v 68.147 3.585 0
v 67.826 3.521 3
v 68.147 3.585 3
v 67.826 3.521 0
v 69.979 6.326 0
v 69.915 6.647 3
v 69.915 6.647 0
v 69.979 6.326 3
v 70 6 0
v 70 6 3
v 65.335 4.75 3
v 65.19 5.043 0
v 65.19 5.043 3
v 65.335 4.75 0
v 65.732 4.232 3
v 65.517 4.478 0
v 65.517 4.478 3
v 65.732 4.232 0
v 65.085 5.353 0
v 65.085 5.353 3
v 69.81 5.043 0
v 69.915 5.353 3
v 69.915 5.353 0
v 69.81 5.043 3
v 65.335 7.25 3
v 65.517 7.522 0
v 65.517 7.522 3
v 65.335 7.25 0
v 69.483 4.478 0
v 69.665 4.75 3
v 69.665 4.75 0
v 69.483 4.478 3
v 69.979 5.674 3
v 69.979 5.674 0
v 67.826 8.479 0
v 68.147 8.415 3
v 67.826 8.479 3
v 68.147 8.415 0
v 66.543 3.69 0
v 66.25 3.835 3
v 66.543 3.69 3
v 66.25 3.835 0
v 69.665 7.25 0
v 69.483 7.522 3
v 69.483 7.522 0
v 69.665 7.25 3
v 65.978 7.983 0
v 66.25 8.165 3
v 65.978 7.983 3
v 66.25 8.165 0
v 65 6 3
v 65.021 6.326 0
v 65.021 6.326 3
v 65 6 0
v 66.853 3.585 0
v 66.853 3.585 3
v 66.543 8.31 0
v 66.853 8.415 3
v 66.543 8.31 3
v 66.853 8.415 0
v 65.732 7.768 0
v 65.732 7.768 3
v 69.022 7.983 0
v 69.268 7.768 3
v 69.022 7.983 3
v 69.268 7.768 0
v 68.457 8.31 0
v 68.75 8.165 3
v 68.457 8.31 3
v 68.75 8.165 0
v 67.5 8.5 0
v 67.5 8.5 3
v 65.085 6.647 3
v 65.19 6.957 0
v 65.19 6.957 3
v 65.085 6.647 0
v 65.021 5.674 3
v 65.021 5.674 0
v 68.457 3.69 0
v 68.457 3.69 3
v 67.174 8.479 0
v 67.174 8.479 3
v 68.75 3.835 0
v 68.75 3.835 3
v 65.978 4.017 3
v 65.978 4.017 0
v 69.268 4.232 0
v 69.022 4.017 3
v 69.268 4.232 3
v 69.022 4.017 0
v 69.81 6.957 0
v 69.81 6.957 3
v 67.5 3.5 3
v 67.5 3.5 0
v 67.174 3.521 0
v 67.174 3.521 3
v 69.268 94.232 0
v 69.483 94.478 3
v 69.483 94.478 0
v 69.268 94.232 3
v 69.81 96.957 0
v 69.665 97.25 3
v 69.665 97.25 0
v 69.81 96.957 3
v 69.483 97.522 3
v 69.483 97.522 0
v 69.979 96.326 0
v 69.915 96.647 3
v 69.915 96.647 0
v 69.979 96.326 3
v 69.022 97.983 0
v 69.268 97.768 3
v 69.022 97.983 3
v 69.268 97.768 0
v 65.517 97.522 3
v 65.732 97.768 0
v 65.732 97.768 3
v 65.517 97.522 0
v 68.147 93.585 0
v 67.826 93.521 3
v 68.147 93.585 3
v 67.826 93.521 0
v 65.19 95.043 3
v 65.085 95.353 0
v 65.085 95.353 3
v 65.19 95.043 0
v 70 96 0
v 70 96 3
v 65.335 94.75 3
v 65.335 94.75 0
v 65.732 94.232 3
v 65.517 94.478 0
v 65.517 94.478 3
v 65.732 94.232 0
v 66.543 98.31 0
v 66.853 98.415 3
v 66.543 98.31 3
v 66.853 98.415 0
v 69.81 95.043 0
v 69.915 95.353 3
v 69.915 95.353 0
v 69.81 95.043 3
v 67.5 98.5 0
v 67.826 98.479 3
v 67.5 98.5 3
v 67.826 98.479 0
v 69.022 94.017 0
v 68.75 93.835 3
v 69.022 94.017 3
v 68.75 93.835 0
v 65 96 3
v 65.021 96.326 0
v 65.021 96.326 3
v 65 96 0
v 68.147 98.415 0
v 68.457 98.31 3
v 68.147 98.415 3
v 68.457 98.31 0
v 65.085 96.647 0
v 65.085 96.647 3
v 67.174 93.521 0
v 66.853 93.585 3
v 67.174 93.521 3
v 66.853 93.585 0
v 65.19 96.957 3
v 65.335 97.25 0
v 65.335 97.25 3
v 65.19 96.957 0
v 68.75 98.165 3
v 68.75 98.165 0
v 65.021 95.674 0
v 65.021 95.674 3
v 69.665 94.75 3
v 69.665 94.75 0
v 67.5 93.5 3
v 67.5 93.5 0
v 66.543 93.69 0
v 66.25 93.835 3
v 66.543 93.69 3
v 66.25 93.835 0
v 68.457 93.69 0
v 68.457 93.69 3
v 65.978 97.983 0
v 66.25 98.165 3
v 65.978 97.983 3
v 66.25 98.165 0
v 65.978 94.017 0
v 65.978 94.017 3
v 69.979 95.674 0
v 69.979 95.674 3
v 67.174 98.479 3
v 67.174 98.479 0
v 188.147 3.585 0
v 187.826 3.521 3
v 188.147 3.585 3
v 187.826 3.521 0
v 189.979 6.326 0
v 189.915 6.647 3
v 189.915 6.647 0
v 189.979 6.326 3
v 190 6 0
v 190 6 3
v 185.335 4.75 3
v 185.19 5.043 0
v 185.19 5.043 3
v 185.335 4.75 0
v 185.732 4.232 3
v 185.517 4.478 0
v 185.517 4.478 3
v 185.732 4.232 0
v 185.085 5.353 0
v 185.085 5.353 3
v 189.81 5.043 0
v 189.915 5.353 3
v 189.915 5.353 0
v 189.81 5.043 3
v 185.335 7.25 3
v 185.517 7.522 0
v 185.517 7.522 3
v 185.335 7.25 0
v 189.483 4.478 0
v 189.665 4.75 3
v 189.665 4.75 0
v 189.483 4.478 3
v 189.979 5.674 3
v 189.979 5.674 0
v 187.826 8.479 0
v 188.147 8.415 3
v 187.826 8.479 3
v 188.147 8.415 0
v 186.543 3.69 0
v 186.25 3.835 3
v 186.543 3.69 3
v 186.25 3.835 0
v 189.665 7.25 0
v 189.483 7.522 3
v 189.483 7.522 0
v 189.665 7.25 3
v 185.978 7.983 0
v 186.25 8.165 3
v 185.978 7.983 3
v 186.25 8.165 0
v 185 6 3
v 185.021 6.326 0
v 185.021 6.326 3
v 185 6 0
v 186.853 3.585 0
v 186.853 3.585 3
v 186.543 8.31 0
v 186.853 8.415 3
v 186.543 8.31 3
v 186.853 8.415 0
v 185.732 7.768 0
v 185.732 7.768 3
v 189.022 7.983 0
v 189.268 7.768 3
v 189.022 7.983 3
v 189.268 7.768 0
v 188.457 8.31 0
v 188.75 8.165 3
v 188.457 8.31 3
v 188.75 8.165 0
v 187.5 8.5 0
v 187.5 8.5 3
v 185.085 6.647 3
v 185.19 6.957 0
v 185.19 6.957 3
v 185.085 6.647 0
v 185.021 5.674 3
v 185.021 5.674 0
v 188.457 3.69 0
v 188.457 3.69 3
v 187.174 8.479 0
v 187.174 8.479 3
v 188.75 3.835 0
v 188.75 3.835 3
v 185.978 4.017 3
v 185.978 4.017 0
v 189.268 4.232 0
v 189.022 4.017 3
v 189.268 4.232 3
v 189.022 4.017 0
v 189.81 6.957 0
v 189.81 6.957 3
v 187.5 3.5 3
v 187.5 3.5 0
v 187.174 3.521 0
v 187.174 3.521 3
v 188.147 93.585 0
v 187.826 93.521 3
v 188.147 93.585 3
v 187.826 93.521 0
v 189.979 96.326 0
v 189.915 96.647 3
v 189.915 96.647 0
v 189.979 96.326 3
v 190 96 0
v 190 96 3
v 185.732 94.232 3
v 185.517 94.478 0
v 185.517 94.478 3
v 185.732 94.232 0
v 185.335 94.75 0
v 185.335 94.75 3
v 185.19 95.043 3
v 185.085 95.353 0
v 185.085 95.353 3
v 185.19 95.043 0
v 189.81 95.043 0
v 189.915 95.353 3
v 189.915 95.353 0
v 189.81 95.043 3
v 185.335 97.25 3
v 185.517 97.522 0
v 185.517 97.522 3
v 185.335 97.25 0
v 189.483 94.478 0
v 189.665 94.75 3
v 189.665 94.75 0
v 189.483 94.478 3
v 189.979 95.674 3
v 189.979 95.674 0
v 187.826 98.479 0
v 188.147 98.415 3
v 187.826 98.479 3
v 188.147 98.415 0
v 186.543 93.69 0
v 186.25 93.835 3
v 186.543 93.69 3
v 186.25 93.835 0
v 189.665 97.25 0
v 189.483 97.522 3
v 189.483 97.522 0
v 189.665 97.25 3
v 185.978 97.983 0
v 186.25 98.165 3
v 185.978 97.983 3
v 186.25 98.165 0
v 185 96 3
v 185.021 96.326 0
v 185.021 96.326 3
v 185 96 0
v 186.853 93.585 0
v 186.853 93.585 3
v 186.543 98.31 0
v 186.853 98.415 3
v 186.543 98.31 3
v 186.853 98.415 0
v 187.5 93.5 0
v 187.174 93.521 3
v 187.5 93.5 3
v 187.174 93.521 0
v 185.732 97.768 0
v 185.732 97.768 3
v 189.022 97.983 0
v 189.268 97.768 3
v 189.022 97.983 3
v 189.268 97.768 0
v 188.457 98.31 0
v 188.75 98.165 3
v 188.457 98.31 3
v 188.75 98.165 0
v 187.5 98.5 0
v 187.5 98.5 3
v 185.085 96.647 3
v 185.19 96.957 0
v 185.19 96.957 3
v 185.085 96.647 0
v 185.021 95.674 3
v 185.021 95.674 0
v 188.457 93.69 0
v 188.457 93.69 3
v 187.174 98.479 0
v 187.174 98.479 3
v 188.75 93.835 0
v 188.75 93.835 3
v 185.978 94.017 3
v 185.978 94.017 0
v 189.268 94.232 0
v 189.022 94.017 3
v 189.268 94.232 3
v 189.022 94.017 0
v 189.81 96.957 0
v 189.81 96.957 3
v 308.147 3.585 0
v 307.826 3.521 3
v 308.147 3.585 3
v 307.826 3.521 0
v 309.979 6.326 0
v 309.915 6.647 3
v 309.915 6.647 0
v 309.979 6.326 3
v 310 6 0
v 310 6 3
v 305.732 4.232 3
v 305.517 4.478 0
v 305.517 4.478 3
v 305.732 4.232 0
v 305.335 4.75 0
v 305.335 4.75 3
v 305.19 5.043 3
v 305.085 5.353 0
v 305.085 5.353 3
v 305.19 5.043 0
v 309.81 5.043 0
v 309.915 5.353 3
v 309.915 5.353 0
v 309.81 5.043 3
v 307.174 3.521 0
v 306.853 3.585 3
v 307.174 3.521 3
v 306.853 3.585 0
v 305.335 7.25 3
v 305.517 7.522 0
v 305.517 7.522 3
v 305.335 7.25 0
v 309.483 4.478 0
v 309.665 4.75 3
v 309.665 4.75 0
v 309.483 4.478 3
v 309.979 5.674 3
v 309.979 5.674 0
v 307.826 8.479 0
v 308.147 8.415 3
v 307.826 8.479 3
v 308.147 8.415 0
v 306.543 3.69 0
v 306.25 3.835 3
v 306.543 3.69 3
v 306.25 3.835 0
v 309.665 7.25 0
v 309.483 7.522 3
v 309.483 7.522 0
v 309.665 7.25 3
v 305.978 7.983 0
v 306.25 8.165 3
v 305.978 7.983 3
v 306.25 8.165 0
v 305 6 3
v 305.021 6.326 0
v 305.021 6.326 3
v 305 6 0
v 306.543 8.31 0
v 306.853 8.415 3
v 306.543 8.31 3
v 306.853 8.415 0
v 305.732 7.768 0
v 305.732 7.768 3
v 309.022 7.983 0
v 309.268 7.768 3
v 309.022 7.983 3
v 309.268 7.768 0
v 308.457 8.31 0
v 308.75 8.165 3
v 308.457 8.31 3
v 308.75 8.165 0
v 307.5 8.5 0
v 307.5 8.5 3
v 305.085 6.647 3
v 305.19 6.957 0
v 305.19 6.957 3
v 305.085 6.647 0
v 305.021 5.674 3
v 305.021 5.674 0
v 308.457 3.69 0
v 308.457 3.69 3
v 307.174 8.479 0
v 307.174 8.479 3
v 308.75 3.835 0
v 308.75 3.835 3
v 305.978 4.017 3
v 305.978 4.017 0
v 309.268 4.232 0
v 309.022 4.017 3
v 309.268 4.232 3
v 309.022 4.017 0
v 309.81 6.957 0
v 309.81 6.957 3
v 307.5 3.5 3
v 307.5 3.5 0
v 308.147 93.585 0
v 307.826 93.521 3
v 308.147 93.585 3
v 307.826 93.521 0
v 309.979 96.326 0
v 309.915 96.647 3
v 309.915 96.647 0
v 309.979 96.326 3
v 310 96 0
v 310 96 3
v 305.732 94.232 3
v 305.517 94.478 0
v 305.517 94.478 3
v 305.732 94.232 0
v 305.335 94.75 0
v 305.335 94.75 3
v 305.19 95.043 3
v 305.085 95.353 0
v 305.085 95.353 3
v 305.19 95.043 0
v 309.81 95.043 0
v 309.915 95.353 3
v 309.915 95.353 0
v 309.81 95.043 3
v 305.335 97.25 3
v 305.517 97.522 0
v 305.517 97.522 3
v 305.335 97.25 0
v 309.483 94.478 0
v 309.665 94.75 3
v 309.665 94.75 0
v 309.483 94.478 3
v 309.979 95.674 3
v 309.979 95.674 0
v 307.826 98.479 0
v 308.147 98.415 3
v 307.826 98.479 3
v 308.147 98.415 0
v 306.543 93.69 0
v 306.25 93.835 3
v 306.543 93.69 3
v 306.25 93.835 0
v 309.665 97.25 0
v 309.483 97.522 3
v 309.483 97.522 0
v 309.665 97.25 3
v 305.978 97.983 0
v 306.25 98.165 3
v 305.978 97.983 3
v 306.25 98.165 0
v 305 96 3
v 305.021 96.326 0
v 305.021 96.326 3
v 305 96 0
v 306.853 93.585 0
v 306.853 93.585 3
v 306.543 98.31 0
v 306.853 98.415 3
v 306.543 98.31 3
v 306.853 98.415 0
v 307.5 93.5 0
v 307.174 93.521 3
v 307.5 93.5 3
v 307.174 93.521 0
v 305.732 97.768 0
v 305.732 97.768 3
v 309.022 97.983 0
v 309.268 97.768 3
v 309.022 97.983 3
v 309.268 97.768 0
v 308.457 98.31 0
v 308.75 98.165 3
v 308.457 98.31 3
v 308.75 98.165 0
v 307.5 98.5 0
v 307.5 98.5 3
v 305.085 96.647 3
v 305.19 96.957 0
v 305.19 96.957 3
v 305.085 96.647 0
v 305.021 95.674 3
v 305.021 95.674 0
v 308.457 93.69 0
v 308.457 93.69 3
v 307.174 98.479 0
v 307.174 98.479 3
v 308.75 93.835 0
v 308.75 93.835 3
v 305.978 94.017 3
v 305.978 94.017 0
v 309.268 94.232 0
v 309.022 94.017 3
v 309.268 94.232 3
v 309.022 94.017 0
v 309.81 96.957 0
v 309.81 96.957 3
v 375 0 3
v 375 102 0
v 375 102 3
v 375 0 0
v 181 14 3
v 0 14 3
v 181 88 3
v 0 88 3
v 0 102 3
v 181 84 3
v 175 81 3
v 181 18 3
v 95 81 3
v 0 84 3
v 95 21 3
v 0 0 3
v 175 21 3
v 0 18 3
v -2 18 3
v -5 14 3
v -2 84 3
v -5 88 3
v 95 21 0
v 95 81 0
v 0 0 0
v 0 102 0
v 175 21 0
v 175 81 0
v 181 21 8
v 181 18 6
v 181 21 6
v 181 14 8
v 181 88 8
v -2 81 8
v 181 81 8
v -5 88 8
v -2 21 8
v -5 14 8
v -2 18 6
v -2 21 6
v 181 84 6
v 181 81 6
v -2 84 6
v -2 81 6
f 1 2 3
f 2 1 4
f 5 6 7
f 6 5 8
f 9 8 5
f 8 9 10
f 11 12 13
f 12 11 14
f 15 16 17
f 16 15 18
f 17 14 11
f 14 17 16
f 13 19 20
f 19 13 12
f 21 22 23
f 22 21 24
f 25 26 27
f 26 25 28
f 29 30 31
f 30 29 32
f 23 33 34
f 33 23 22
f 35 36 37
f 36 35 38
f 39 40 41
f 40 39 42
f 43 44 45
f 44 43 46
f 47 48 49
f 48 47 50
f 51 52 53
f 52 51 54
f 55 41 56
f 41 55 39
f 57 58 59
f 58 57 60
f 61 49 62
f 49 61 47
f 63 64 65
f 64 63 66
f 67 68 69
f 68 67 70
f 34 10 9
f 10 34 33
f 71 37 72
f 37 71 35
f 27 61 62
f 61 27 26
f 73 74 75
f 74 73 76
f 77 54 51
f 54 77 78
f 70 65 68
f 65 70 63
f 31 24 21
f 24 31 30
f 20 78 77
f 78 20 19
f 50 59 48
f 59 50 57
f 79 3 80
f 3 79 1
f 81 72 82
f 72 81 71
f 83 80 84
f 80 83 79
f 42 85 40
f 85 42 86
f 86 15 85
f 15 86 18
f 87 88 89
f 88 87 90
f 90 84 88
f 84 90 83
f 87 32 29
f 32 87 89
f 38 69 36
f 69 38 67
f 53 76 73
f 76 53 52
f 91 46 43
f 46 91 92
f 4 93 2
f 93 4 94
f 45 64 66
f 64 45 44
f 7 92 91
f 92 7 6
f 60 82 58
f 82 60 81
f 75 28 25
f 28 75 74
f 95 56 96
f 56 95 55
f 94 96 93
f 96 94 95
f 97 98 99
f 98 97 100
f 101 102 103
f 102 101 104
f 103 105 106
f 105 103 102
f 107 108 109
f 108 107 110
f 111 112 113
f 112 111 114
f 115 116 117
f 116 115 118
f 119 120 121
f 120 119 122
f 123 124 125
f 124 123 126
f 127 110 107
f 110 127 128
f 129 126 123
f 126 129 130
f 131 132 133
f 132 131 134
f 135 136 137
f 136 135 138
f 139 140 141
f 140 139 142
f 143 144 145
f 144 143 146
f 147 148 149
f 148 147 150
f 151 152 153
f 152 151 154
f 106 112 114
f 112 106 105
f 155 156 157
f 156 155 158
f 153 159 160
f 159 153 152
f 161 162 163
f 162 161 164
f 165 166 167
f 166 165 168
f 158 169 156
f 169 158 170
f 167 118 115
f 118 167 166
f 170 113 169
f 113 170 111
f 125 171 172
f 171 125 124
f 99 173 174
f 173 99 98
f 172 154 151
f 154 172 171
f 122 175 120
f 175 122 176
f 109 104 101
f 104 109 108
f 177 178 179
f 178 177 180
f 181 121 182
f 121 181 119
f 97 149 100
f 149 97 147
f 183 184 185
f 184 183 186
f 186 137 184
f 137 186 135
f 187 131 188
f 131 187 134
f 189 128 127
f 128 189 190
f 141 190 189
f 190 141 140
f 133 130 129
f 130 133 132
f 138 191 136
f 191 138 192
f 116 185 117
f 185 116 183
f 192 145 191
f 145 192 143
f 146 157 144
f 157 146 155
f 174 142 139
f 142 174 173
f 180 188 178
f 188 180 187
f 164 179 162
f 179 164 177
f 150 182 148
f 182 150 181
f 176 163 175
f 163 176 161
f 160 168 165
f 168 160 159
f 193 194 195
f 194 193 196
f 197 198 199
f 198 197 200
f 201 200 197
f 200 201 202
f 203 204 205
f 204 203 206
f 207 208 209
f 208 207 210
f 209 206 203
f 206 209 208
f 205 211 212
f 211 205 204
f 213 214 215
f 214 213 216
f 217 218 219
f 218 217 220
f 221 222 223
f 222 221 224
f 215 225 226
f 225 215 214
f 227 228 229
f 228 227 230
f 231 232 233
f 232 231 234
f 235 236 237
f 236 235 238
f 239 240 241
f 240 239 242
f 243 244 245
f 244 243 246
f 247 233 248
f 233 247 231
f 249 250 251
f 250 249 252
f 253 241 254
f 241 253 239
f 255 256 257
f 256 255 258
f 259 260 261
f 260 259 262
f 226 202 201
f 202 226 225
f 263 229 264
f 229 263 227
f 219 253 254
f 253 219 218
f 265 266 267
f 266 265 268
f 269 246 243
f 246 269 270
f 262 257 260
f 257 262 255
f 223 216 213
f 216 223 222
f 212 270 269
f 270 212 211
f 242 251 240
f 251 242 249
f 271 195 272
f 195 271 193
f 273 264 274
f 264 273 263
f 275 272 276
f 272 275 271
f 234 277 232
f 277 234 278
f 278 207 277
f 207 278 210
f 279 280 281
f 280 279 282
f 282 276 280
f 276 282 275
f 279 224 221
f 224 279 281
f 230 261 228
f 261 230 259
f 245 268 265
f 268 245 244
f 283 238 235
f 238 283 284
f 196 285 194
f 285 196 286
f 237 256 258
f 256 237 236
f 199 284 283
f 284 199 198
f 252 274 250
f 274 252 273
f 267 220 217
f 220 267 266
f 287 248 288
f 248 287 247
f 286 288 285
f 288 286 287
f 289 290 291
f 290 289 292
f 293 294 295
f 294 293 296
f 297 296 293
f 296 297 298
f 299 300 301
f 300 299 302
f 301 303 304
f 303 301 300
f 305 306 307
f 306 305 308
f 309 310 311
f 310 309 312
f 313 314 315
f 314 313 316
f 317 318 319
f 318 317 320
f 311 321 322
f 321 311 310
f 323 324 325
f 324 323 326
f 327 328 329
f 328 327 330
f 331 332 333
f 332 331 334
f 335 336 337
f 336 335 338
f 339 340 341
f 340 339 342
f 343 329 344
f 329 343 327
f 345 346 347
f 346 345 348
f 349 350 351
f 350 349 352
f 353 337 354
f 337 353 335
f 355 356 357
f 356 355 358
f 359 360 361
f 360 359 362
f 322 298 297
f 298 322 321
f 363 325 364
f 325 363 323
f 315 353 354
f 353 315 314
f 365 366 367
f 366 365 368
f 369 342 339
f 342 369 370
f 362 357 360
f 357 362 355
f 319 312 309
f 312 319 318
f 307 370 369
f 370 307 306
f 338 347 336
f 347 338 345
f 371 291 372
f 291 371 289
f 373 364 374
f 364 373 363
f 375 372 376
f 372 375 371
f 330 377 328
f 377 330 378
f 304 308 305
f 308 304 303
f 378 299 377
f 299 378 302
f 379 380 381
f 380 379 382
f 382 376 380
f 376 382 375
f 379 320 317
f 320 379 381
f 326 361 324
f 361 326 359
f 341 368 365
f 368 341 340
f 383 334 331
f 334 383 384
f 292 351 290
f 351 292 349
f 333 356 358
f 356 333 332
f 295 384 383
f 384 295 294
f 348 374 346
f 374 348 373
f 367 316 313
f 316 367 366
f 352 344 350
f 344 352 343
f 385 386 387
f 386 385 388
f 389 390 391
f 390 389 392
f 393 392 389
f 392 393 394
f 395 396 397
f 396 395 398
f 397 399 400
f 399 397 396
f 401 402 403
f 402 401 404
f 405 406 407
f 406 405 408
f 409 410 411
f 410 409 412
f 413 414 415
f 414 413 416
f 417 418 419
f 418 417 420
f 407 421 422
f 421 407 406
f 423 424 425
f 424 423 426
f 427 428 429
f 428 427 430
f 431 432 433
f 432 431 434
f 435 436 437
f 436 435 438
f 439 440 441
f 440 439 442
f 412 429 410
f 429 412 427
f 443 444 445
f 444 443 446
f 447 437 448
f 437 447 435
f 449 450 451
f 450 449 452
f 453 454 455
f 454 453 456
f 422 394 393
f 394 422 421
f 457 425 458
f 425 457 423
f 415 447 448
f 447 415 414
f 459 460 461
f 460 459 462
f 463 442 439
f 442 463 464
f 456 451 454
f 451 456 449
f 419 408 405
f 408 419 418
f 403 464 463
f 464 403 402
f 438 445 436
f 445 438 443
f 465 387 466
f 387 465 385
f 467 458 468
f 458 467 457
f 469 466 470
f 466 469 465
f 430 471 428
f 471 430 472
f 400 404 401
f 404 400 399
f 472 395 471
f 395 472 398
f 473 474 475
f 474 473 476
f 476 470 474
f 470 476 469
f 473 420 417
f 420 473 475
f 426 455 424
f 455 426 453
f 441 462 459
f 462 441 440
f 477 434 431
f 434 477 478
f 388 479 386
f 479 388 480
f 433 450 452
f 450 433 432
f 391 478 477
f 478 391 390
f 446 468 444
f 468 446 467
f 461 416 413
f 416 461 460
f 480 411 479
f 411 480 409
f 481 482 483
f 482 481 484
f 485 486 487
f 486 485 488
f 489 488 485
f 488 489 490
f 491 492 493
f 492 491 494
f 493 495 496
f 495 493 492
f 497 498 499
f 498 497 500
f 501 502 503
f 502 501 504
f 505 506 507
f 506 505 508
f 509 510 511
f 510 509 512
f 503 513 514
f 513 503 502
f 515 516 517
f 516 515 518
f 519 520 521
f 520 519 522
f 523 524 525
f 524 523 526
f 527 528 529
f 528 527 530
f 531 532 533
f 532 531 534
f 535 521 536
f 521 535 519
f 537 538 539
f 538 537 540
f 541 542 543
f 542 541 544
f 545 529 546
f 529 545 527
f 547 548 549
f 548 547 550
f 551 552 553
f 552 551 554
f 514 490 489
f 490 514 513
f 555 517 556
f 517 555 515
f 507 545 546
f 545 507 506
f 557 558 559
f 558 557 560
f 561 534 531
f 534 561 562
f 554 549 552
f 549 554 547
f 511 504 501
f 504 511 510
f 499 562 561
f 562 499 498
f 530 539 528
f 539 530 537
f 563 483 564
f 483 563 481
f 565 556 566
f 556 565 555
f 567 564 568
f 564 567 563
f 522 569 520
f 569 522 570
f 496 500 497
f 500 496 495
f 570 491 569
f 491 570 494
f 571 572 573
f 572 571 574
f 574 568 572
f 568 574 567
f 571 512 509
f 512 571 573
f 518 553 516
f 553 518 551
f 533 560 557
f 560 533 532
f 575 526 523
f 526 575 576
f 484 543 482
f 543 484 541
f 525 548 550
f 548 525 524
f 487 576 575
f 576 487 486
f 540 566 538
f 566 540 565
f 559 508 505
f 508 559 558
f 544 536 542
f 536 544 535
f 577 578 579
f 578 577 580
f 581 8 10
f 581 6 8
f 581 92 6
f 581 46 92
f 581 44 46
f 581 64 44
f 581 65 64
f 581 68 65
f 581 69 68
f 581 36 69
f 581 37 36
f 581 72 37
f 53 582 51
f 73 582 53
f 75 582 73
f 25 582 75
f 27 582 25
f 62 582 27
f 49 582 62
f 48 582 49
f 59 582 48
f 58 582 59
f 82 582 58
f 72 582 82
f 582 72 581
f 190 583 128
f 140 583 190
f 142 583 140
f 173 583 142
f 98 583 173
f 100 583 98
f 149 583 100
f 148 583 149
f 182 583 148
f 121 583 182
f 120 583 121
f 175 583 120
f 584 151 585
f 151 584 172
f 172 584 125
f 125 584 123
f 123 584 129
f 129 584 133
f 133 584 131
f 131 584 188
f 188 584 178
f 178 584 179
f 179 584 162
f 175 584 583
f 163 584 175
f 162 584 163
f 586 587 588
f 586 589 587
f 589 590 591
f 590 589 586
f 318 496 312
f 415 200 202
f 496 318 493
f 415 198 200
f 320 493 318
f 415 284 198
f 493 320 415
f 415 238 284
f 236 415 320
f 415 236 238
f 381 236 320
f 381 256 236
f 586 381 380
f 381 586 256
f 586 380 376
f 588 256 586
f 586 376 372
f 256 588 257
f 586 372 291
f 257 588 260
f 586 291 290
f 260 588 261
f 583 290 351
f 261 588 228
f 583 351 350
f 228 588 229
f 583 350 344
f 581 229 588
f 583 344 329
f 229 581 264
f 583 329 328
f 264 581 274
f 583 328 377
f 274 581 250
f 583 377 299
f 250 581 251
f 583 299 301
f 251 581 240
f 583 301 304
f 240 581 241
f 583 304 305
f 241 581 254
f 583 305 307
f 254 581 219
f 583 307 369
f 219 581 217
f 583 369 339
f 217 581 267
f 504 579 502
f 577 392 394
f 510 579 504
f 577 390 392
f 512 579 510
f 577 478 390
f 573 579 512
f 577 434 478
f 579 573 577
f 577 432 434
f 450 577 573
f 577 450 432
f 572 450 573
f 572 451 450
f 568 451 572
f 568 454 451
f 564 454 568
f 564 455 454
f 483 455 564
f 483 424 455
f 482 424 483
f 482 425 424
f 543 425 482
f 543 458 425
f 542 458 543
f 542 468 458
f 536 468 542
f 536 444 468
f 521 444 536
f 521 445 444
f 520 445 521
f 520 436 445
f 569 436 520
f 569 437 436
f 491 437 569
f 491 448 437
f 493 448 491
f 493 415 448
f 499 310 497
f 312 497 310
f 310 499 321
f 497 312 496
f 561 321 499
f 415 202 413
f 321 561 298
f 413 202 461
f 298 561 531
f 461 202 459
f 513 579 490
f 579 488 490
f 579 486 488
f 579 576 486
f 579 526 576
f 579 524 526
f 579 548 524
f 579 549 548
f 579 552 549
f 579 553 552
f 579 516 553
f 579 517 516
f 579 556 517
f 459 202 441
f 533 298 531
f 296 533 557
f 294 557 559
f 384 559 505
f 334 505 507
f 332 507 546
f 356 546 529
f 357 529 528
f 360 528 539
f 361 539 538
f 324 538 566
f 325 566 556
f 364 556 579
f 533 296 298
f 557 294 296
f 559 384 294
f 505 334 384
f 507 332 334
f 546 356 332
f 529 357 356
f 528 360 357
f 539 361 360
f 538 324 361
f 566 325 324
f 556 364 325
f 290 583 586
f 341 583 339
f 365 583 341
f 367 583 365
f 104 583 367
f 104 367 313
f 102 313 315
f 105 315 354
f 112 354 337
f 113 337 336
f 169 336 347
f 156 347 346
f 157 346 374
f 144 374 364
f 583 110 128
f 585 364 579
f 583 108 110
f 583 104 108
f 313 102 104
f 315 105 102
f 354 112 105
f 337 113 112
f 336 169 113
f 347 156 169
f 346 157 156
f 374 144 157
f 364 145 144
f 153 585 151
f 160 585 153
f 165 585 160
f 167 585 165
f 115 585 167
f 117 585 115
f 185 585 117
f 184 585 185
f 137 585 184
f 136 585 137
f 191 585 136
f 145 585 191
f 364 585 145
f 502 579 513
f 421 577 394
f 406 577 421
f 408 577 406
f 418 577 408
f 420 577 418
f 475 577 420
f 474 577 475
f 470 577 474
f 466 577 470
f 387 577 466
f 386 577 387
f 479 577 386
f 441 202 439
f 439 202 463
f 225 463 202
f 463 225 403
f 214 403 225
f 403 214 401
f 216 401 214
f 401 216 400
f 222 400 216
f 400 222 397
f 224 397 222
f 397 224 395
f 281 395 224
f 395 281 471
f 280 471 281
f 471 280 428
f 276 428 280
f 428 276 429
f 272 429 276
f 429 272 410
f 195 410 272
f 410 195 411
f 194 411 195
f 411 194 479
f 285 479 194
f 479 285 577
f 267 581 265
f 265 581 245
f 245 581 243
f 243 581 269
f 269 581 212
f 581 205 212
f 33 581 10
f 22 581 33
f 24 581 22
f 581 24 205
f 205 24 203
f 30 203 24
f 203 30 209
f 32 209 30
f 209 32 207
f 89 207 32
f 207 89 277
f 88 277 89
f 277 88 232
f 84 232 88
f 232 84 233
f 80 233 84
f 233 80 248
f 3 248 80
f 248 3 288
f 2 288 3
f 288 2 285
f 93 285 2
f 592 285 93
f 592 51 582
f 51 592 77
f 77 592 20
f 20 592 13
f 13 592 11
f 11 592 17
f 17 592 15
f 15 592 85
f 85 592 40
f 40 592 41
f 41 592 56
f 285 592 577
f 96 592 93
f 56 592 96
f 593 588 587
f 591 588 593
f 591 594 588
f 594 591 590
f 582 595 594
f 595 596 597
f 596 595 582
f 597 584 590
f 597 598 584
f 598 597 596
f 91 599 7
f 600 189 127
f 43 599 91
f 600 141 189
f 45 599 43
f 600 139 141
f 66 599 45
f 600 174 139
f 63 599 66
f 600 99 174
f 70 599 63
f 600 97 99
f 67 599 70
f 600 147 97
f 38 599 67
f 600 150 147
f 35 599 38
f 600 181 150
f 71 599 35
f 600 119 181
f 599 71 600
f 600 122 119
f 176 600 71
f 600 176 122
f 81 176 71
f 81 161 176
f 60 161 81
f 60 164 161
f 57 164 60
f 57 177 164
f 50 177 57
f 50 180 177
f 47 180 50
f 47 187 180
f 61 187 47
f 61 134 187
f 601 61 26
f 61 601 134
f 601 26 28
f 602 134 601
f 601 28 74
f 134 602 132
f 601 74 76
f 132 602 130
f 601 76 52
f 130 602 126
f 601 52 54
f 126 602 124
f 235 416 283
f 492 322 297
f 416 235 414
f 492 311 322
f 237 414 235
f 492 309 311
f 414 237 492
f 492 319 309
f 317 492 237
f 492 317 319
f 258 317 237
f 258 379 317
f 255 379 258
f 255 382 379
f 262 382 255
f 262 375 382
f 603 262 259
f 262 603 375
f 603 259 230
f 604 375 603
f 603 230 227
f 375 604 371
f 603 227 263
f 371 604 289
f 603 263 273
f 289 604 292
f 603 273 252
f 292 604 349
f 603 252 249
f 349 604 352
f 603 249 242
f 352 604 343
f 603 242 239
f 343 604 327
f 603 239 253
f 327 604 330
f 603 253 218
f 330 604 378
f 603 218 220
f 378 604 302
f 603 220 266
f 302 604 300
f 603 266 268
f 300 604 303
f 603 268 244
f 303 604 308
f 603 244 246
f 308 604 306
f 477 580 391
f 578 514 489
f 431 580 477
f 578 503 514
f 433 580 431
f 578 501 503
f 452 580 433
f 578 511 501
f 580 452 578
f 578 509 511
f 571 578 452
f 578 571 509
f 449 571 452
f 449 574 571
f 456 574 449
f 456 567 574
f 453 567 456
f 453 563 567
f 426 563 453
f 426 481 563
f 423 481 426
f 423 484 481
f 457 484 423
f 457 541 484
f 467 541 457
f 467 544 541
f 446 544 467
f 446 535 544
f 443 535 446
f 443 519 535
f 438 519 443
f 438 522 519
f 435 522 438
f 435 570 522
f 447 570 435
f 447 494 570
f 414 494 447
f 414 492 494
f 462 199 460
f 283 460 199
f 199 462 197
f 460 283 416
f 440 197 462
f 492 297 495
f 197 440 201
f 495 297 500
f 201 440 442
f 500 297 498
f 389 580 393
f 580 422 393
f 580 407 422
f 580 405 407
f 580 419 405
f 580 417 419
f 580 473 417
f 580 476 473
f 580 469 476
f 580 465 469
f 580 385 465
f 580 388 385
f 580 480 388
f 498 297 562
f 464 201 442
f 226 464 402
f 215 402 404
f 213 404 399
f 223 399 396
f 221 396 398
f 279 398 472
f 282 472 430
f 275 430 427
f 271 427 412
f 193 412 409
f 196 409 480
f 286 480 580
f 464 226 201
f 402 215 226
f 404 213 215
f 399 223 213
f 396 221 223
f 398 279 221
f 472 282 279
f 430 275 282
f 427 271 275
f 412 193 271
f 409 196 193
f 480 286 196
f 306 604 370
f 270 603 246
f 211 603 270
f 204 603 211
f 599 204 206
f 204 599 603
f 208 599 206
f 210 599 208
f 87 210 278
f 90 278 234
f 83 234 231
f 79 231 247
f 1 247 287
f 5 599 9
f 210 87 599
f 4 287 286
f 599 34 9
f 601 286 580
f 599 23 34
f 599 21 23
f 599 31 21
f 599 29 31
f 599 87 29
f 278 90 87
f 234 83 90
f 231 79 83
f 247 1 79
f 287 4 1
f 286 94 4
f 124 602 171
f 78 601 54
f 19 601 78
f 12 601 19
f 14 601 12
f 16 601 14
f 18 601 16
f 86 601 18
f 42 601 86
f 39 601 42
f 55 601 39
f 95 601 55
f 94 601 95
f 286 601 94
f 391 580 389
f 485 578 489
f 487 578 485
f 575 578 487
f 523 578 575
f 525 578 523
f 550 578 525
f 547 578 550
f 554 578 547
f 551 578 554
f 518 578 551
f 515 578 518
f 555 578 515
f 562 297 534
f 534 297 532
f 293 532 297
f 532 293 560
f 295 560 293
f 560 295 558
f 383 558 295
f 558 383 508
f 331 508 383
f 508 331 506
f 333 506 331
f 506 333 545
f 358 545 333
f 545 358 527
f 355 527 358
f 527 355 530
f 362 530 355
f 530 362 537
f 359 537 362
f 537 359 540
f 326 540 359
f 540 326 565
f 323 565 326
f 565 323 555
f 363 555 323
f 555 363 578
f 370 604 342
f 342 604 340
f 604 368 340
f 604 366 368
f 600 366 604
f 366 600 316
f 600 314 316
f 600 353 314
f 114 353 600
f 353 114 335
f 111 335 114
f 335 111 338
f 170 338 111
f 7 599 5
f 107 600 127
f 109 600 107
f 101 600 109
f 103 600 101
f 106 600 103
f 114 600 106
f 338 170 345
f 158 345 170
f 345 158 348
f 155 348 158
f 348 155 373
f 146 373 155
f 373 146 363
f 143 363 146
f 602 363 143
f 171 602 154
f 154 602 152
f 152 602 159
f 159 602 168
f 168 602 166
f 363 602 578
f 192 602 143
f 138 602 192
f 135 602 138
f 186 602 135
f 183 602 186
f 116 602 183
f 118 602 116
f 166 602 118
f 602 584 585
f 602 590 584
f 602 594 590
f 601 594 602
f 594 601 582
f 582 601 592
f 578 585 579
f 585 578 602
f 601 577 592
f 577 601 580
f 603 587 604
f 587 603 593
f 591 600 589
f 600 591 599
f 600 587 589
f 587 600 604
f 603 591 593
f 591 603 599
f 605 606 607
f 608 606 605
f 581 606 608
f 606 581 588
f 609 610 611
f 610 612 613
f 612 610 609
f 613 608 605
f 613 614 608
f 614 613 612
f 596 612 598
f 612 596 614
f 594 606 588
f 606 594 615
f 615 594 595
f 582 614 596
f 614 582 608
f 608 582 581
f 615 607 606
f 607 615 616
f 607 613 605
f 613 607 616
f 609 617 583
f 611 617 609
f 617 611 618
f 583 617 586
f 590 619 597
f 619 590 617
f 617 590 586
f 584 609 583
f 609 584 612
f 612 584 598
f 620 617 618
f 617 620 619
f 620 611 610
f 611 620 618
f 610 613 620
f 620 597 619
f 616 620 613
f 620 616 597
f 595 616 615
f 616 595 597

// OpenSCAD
// E12 deck plate - sliding battery access door
//
// Part 1 (base): full plate, 6 mounting holes, rectangular access opening,
//                captive C-channel rails either side of the opening.
// Part 2 (door): panel that slides in those rails to expose/cover the opening.
//
// Rails sit INBOARD of the mounting holes (holes at y=6/96, rails at y=18/84)
// so they never clash. The opening sits BETWEEN hole pairs so no fastener is lost.
//
// Opening defaults to the widest clear bay. Set OPEN_X0/OPEN_X1 to move it.

$fn = 48;

PLATE_L = 375;
PLATE_W = 102;
T       = 3;

PITCH   = 120;
SPAN_W  = 90;
FIRST_X = 67.5;  // PROVISIONAL: centred pattern (375-240)/2
HOLE_D  = 5.0;
N_PAIRS = 3;

// --- access opening (between hole pairs 2 and 3: x=135 and x=255) ---
OPEN_X0 = 95;
OPEN_X1 = 175;
OPEN_W  = 60;           // across the plate

// --- slide hardware ---
DOOR_T    = 2.4;        // door thickness
CHAN_H    = 3.0;        // channel height (0.6 clearance over the door)
LIP       = 3;          // how far the lip overhangs inward
RAIL_W    = 4;          // rail wall thickness
CLR       = 0.4;        // side clearance

DOOR_L    = (OPEN_X1 - OPEN_X0) + 14;      // overlap each end
DOOR_W    = OPEN_W + 2*LIP;                 // sits under the lips
TRAVEL    = DOOR_L + 6;                     // retract room

RAIL_Y0 = PLATE_W/2 - DOOR_W/2;             // channel inner faces
RAIL_Y1 = PLATE_W/2 + DOOR_W/2;
RAIL_X0 = OPEN_X0 - TRAVEL;
RAIL_X1 = OPEN_X1 + 6;

module mount_holes() {
  for (i = [0 : N_PAIRS-1]) {
    x = FIRST_X + i*PITCH;
    translate([x, PLATE_W/2 - SPAN_W/2, -1]) cylinder(d=HOLE_D, h=T+2);
    translate([x, PLATE_W/2 + SPAN_W/2, -1]) cylinder(d=HOLE_D, h=T+2);
  }
}

module rail(ymin) {
  // vertical wall plus an inward lip at the top -> C-channel
  translate([RAIL_X0, ymin - RAIL_W, T]) cube([RAIL_X1-RAIL_X0, RAIL_W, CHAN_H + 2]);
  translate([RAIL_X0, ymin, T + CHAN_H])  cube([RAIL_X1-RAIL_X0, LIP, 2]);
}

module base() {
  difference() {
    cube([PLATE_L, PLATE_W, T]);
    translate([OPEN_X0, PLATE_W/2 - OPEN_W/2, -1])
      cube([OPEN_X1-OPEN_X0, OPEN_W, T+2]);
    mount_holes();
  }
  rail(RAIL_Y0);
  mirror([0,1,0]) translate([0,-PLATE_W,0]) rail(RAIL_Y0);
  // end stop so the door cannot slide out of the retracted end
  translate([RAIL_X0, RAIL_Y0 - RAIL_W, T]) cube([3, DOOR_W + 2*RAIL_W, CHAN_H + 2]);
}

module door() {
  difference() {
    union() {
      cube([DOOR_L, DOOR_W - 2*CLR, DOOR_T]);
      // finger tab
      translate([DOOR_L - 12, (DOOR_W - 2*CLR)/2 - 9, DOOR_T])
        cube([10, 18, 3]);
    }
    // grip ribs on the tab
    for (i=[0:3])
      translate([DOOR_L - 11 + i*2.4, -1, DOOR_T + 2.2])
        rotate([0,45,0]) cube([1.2, DOOR_W, 1.2]);
  }
}

// ---- split for printers under 375 mm ------------------------------------
// Split at x=290: rails (40-246) and opening (150-240) stay wholly in part A,
// so nothing that must stay aligned crosses the joint. All three hole pairs
// (15/135/255) are also in A. Part B is a plain extension.
SPLIT_X = 250;
LAP     = 35;          // overlap length
PIN_D   = 4.2;

// Registration keys instead of pin holes. Two integral bosses on B's tongue
// drop into matching pockets in A's rebate, so the halves self-align and stay
// put with glue alone - no separate pins, nothing to source.
KEY_L = 10; KEY_W = 5; KEY_H = 1.2; KEY_CLR = 0.25;

module key_solid() {
  for (dx = [10, 25])
    translate([SPLIT_X - LAP + dx - KEY_L/2, PLATE_W/2 - KEY_W/2, T/2])
      cube([KEY_L, KEY_W, KEY_H]);
}
module key_pocket() {
  for (dx = [10, 25])
    translate([SPLIT_X - LAP + dx - KEY_L/2 - KEY_CLR,
               PLATE_W/2 - KEY_W/2 - KEY_CLR, T/2 - 0.01])
      cube([KEY_L + 2*KEY_CLR, KEY_W + 2*KEY_CLR, KEY_H + KEY_CLR]);
}

module base_A() {
  difference() {
    intersection() {
      base();
      translate([-1, -1, -1]) cube([SPLIT_X + 1, PLATE_W + 2, 40]);
    }
    // rebate in A's underside to receive B's tongue
    translate([SPLIT_X - LAP, -1, -0.1]) cube([LAP + 1, PLATE_W + 2, T/2 + 0.1]);
    key_pocket();
  }
}

module base_B() {
  difference() {
    union() {
      translate([SPLIT_X, 0, 0]) cube([PLATE_L - SPLIT_X, PLATE_W, T]);
      translate([SPLIT_X - LAP, 0, 0]) cube([LAP, PLATE_W, T/2]);   // tongue
      key_solid();
    }
    mount_holes();     // <-- part B needs its fasteners too
  }
}

PART = "base";    // "base" | "door" | "baseA" | "baseB"
if      (PART == "base")  base();
else if (PART == "door")  door();
else if (PART == "baseA") base_A();
else if (PART == "baseB") base_B();
